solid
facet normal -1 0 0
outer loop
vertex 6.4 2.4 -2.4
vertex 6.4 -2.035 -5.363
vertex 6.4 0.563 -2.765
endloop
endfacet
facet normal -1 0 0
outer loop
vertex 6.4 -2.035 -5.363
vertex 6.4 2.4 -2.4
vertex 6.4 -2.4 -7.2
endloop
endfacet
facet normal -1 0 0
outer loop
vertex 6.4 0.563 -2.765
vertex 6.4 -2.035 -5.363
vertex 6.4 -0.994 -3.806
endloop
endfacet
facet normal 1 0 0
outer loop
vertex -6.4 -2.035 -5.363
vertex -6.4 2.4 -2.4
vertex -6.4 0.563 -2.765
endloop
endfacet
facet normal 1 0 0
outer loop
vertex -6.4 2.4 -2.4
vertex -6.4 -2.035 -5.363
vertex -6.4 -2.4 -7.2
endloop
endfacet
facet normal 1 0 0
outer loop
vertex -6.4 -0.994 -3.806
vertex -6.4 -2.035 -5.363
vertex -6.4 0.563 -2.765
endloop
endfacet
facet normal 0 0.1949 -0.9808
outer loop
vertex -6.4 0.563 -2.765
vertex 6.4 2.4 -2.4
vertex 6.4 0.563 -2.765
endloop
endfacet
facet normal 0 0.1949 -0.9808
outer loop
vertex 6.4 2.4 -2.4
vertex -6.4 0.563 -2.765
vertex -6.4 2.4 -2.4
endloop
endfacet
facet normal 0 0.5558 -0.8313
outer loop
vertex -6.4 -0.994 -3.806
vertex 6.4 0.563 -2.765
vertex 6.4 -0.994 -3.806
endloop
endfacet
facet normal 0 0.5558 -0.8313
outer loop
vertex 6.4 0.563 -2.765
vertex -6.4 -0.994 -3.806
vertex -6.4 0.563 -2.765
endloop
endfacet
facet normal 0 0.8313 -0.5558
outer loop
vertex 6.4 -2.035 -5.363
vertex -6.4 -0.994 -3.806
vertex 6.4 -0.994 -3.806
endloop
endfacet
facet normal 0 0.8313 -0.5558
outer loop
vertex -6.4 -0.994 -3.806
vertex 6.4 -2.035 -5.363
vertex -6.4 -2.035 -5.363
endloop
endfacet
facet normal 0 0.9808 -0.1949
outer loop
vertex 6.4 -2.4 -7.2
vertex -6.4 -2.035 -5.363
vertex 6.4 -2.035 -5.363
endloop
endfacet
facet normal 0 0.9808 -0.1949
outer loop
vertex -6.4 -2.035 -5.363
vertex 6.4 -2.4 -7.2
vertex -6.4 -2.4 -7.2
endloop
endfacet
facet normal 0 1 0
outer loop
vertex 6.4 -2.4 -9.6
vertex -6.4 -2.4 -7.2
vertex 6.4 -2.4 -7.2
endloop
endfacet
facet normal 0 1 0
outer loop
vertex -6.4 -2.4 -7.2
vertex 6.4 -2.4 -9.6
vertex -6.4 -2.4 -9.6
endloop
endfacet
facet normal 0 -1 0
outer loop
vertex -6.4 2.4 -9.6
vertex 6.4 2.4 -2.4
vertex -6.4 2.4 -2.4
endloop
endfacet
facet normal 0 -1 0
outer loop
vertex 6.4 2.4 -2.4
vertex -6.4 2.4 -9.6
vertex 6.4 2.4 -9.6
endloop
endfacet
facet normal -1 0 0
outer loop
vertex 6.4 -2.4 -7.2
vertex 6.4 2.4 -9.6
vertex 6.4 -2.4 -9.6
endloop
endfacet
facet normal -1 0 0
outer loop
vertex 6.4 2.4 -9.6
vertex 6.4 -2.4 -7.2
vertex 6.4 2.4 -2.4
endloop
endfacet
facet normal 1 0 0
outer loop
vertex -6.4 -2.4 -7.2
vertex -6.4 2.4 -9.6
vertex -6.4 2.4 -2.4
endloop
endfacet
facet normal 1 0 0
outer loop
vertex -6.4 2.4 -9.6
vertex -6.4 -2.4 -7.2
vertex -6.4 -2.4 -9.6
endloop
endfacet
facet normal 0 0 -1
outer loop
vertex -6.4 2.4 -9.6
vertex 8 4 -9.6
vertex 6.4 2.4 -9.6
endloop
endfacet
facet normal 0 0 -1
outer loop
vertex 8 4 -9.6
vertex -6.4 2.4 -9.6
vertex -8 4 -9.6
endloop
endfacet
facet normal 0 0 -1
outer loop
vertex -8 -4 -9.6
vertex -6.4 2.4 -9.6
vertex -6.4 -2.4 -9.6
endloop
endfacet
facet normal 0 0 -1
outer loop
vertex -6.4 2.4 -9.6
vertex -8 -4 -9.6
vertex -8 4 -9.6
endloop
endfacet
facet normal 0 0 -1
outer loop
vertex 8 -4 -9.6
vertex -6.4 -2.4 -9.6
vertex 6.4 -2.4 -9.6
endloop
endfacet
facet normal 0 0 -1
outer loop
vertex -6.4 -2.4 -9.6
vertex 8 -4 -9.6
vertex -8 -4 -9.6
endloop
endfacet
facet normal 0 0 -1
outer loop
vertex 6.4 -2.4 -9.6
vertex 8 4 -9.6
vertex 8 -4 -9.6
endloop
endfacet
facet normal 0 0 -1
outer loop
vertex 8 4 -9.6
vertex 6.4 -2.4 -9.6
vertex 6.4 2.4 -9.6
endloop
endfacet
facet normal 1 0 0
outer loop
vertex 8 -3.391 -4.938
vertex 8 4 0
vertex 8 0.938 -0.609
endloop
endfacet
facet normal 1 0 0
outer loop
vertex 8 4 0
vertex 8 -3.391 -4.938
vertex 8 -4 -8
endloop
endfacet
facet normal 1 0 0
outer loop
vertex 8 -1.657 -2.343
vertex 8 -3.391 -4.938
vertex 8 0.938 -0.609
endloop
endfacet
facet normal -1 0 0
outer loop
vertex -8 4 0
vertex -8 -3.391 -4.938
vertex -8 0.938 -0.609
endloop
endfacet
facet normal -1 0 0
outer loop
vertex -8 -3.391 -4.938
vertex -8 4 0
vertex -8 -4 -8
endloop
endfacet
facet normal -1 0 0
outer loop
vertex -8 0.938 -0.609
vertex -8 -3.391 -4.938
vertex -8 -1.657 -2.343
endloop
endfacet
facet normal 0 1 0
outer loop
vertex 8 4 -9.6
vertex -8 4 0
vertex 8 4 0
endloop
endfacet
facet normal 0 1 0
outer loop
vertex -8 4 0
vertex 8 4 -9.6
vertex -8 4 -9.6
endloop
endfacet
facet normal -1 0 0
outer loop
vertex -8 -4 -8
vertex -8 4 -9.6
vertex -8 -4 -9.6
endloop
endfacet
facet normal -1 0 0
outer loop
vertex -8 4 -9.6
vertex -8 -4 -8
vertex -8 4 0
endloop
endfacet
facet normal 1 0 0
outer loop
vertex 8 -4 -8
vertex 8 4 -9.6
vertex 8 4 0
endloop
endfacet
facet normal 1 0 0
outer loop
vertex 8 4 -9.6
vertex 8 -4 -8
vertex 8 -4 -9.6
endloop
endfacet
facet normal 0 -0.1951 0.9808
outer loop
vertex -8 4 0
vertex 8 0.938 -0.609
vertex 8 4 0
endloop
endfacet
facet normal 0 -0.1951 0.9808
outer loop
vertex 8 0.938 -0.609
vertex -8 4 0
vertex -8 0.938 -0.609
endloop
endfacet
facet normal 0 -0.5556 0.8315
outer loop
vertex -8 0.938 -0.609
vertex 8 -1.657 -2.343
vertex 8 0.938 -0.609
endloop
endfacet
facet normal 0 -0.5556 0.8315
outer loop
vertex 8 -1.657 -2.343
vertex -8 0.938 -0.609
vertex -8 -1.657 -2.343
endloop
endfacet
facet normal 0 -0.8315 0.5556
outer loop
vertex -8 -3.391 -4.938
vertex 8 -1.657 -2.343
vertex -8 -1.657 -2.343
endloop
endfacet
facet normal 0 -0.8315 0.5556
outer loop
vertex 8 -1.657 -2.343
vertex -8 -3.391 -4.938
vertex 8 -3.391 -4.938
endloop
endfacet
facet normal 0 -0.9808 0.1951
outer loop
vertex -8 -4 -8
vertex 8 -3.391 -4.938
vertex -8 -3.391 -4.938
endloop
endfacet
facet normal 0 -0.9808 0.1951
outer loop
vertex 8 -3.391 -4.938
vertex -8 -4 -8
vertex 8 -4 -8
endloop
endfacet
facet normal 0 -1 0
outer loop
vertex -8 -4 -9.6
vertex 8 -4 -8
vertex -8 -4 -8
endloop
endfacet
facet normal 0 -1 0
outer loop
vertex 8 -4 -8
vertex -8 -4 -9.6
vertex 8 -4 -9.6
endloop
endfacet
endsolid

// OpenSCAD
// file: ../p/rect3.scad
use <../lib.scad>
function ldraw_lib__rect3() = [
// 0 Rectangle with 3 Edges
// 0 Name: rect3.dat
// 0 Author: Mark Kennedy [mkennedy]
// 0 !LDRAW_ORG Primitive UPDATE 2010-01
// 0 !LICENSE Licensed under CC BY 4.0 : see CAreadme.txt
// 
// 0 BFC CERTIFY CCW
  [0,"BFC","CERTIFY"],
  [0,"BFC","CCW"],
// 
// 0 !HISTORY 2003-08-01 [PTadmin] Official Update 2003-02
// 0 !HISTORY 2007-06-24 [PTadmin] Header formatted for Contributor Agreement
// 0 !HISTORY 2008-07-01 [PTadmin] Official Update 2008-01
// 0 !HISTORY 2010-01-17 [mikeheide] Change winding to CCW
// 0 !HISTORY 2010-04-05 [PTadmin] Official Update 2010-01
// 
// 
// 2 24 1 0 1 -1 0 1
  [2,24,1,0,1,-1,0,1],
// 2 24 1 0 1 1 0 -1
  [2,24,1,0,1,1,0,-1],
// 2 24 -1 0 1 -1 0 -1
  [2,24,-1,0,1,-1,0,-1],
// 4 16 -1 0 1 -1 0 -1 1 0 -1 1 0 1
  [4,16,-1,0,1,-1,0,-1,1,0,-1,1,0,1],
// 0 //
];
module ldraw_lib__rect3(step=0, col=false, unit=2/5, alt=false, line=0.2, solid=!$preview)
    makepoly(ldraw_lib__rect3(), step=step, col=col, unit=unit, alt=alt, line=line, solid=solid);
ldraw_lib__rect3(line=0.2);
// file: ../p/rect.scad
use <../lib.scad>
function ldraw_lib__rect() = [
// 0 Rectangle
// 0 Name: rect.dat
// 0 Author: James Jessiman
// 0 !LDRAW_ORG Primitive UPDATE 2010-01
// 0 !LICENSE Licensed under CC BY 4.0 : see CAreadme.txt
// 
// 0 BFC CERTIFY CCW
  [0,"BFC","CERTIFY"],
  [0,"BFC","CCW"],
// 
// 0 !HISTORY 2002-04-05 [hafhead] Added BFC statement
// 0 !HISTORY 2002-04-25 [PTadmin] Official Update 2002-02
// 0 !HISTORY 2007-06-24 [PTadmin] Header formatted for Contributor Agreement
// 0 !HISTORY 2008-07-01 [PTadmin] Official Update 2008-01
// 0 !HISTORY 2010-01-17 [mikeheide] changed winding to CCW
// 0 !HISTORY 2010-04-05 [PTadmin] Official Update 2010-01
// 
// 
// 2 24 1 0 1 -1 0 1
  [2,24,1,0,1,-1,0,1],
// 2 24 -1 0 1 -1 0 -1
  [2,24,-1,0,1,-1,0,-1],
// 2 24 -1 0 -1 1 0 -1
  [2,24,-1,0,-1,1,0,-1],
// 2 24 1 0 -1 1 0 1
  [2,24,1,0,-1,1,0,1],
// 4 16 -1 0 1 -1 0 -1 1 0 -1 1 0 1
  [4,16,-1,0,1,-1,0,-1,1,0,-1,1,0,1],
// 0
];
module ldraw_lib__rect(step=0, col=false, unit=2/5, alt=false, line=0.2, solid=!$preview)
    makepoly(ldraw_lib__rect(), step=step, col=col, unit=unit, alt=alt, line=line, solid=solid);
ldraw_lib__rect(line=0.2);
// file: ../p/1-4edge.scad
use <../lib.scad>
function ldraw_lib__1_4edge() = [
// 0 Circle 0.25
// 0 Name: 1-4edge.dat
// 0 Author: James Jessiman
// 0 !LDRAW_ORG Primitive UPDATE 2017-01
// 0 !LICENSE Licensed under CC BY 4.0 : see CAreadme.txt
// 
// 0 BFC CERTIFY CCW
  [0,"BFC","CERTIFY"],
  [0,"BFC","CCW"],
// 
// 0 !HISTORY 2007-06-22 [PTadmin] Header formatted for Contributor Agreement
// 0 !HISTORY 2008-07-01 [PTadmin] Official Update 2008-01
// 0 !HISTORY 2017-01-15 [Steffen] BFCed
// 0 !HISTORY 2017-12-30 [PTadmin] Official Update 2017-01
// 
// 
// 2 24 1 0 0 0.9239 0 0.3827
  [2,24,1,0,0,0.9239,0,0.3827],
// 2 24 0.9239 0 0.3827 0.7071 0 0.7071
  [2,24,0.9239,0,0.3827,0.7071,0,0.7071],
// 2 24 0.7071 0 0.7071 0.3827 0 0.9239
  [2,24,0.7071,0,0.7071,0.3827,0,0.9239],
// 2 24 0.3827 0 0.9239 0 0 1
  [2,24,0.3827,0,0.9239,0,0,1],
];
module ldraw_lib__1_4edge(step=0, col=false, unit=2/5, alt=false, line=0.2, solid=!$preview)
    makepoly(ldraw_lib__1_4edge(), step=step, col=col, unit=unit, alt=alt, line=line, solid=solid);
ldraw_lib__1_4edge(line=0.2);
// file: ../p/1-4cylo.scad
use <../lib.scad>
use <1-4cyli.scad>
use <1-4edge.scad>
function ldraw_lib__1_4cylo() = [
// 0 Cylinder Open 0.25
// 0 Name: 1-4cylo.dat
// 0 Author: Max Martin Richter [MMR1988]
// 0 !LDRAW_ORG Primitive UPDATE 2010-03
// 0 !LICENSE Licensed under CC BY 4.0 : see CAreadme.txt
// 
// 0 BFC CERTIFY CCW
  [0,"BFC","CERTIFY"],
  [0,"BFC","CCW"],
// 
// 0 !HISTORY 2010-12-31 [PTadmin] Official Update 2010-03
// 
// 
// 1 16 0 0 0 1 0 0 0 1 0 0 0 1 1-4edge.dat
  [1,16,0,0,0,1,0,0,0,1,0,0,0,1, ldraw_lib__1_4edge()],
// 1 16 0 1 0 1 0 0 0 1 0 0 0 1 1-4edge.dat
  [1,16,0,1,0,1,0,0,0,1,0,0,0,1, ldraw_lib__1_4edge()],
// 1 16 0 0 0 1 0 0 0 1 0 0 0 1 1-4cyli.dat
  [1,16,0,0,0,1,0,0,0,1,0,0,0,1, ldraw_lib__1_4cyli()],
];
module ldraw_lib__1_4cylo(step=0, col=false, unit=2/5, alt=false, line=0.2, solid=!$preview)
    makepoly(ldraw_lib__1_4cylo(), step=step, col=col, unit=unit, alt=alt, line=line, solid=solid);
ldraw_lib__1_4cylo(line=0.2);
// file: ../p/1-4chrd.scad
use <../lib.scad>
function ldraw_lib__1_4chrd() = [
// 0 Chord 0.25
// 0 Name: 1-4chrd.dat
// 0 Author: Max Martin Richter [MMR1988]
// 0 !LDRAW_ORG Primitive UPDATE 2023-05
// 0 !LICENSE Licensed under CC BY 4.0 : see CAreadme.txt
// 
// 0 BFC CERTIFY CCW
  [0,"BFC","CERTIFY"],
  [0,"BFC","CCW"],
// 
// 0 !HISTORY 2004-04-22 [PTadmin] Official Update 2004-02
// 0 !HISTORY 2007-10-09 [PTadmin] Header formatted for Contributor Agreement
// 0 !HISTORY 2008-07-01 [PTadmin] Official Update 2008-01
// 0 !HISTORY 2012-08-02 [MMR1988] Re-creation with PrimGen2 and Rectifier
// 0 !HISTORY 2012-08-09 [PTadmin] Official Update 2012-02
// 0 !HISTORY 2023-10-27 [OrionP] Change author to MMR1988 from hafhead
// 0 !HISTORY 2023-10-31 [OrionP] Official Update 2023-05
// 
// 4 16 0.9239 0 0.3827 0.3827 0 0.9239 0 0 1 1 0 0
  [4,16,0.9239,0,0.3827,0.3827,0,0.9239,0,0,1,1,0,0],
// 3 16 0.7071 0 0.7071 0.3827 0 0.9239 0.9239 0 0.3827
  [3,16,0.7071,0,0.7071,0.3827,0,0.9239,0.9239,0,0.3827],
];
module ldraw_lib__1_4chrd(step=0, col=false, unit=2/5, alt=false, line=0.2, solid=!$preview)
    makepoly(ldraw_lib__1_4chrd(), step=step, col=col, unit=unit, alt=alt, line=line, solid=solid);
ldraw_lib__1_4chrd(line=0.2);
// file: s/7134s01.scad
use <../../lib.scad>
use <../../p/1-4chrd.scad>
use <../../p/1-4cylo.scad>
use <../../p/1-4edge.scad>
use <../../p/rect.scad>
use <../../p/rect3.scad>
function ldraw_lib__s__7134s01() = [
// 0 ~Brick  1 x  2 with Curved Top without Stud Holders without Patternable Surfaces
// 0 Name: s\7134s01.dat
// 0 Author: Rene Rechthaler [Blechtaler]
// 0 !LDRAW_ORG Subpart UPDATE 2025-07
// 0 !LICENSE Licensed under CC BY 4.0 : see CAreadme.txt
// 
// 0 BFC CERTIFY CCW
  [0,"BFC","CERTIFY"],
  [0,"BFC","CCW"],
// 
// 0 !HISTORY 2025-04-06 [Blechtaler] made from 37352s01 by [Philo]
// 0 !HISTORY 2025-07-27 [OrionP] Official Update 2025-07
// 
// 0 // inside
// 1 16 16 18 6 0 1 0 -12 0 0 0 0 -12 1-4chrd.dat
  [1,16,16,18,6,0,1,0,-12,0,0,0,0,-12, ldraw_lib__1_4chrd()],
// 1 16 -16 18 6 0 -1 0 -12 0 0 0 0 -12 1-4chrd.dat
  [1,16,-16,18,6,0,-1,0,-12,0,0,0,0,-12, ldraw_lib__1_4chrd()],
// 0 BFC INVERTNEXT
  [0,"BFC","INVERTNEXT"],
// 1 16 -16 18 6 0 32 0 -12 0 0 0 0 -12 1-4cylo.dat
  [1,16,-16,18,6,0,32,0,-12,0,0,0,0,-12, ldraw_lib__1_4cylo()],
// 1 16 0 21 -6 16 0 0 0 0 3 0 -1 0 rect3.dat
  [1,16,0,21,-6,16,0,0,0,0,3,0,-1,0, ldraw_lib__rect3()],
// 1 16 0 15 6 16 0 0 0 0 9 0 1 0 rect.dat
  [1,16,0,15,6,16,0,0,0,0,9,0,1,0, ldraw_lib__rect()],
// 2 24 16 24 6 16 24 -6
  [2,24,16,24,6,16,24,-6],
// 4 16 16 6 6 16 24 6 16 24 -6 16 18 -6
  [4,16,16,6,6,16,24,6,16,24,-6,16,18,-6],
// 2 24 -16 24 -6 -16 24 6
  [2,24,-16,24,-6,-16,24,6],
// 4 16 -16 18 -6 -16 24 -6 -16 24 6 -16 6 6
  [4,16,-16,18,-6,-16,24,-6,-16,24,6,-16,6,6],
// 
// 0 // bottom
// 4 16 20 24 10 16 24 6 -16 24 6 -20 24 10
  [4,16,20,24,10,16,24,6,-16,24,6,-20,24,10],
// 4 16 -20 24 10 -16 24 6 -16 24 -6 -20 24 -10
  [4,16,-20,24,10,-16,24,6,-16,24,-6,-20,24,-10],
// 4 16 -20 24 -10 -16 24 -6 16 24 -6 20 24 -10
  [4,16,-20,24,-10,-16,24,-6,16,24,-6,20,24,-10],
// 4 16 20 24 -10 16 24 -6 16 24 6 20 24 10
  [4,16,20,24,-10,16,24,-6,16,24,6,20,24,10],
// 
// 0 // outer
// 1 16 20 20 10 0 -1 0 -20 0 0 0 0 -20 1-4chrd.dat
  [1,16,20,20,10,0,-1,0,-20,0,0,0,0,-20, ldraw_lib__1_4chrd()],
// 1 16 -20 20 10 0 1 0 -20 0 0 0 0 -20 1-4chrd.dat
  [1,16,-20,20,10,0,1,0,-20,0,0,0,0,-20, ldraw_lib__1_4chrd()],
// 2 24 -20 24 10 -20 24 -10
  [2,24,-20,24,10,-20,24,-10],
// 2 24 20 24 -10 20 24 10
  [2,24,20,24,-10,20,24,10],
// 1 16 0 12 10 -20 0 0 0 0 -12 0 -1 0 rect.dat
  [1,16,0,12,10,-20,0,0,0,0,-12,0,-1,0, ldraw_lib__rect()],
// 4 16 -20 24 10 -20 24 -10 -20 20 -10 -20 0 10
  [4,16,-20,24,10,-20,24,-10,-20,20,-10,-20,0,10],
// 4 16 20 24 -10 20 24 10 20 0 10 20 20 -10
  [4,16,20,24,-10,20,24,10,20,0,10,20,20,-10],
// 1 16 20 20 10 0 -40 0 0 0 -20 -20 0 0 1-4edge.dat
  [1,16,20,20,10,0,-40,0,0,0,-20,-20,0,0, ldraw_lib__1_4edge()],
// 1 16 -20 20 10 0 -40 0 0 0 -20 -20 0 0 1-4edge.dat
  [1,16,-20,20,10,0,-40,0,0,0,-20,-20,0,0, ldraw_lib__1_4edge()],
// 2 24 -20 24 -10 20 24 -10
  [2,24,-20,24,-10,20,24,-10],
// 2 24 -20 24 -10 -20 20 -10
  [2,24,-20,24,-10,-20,20,-10],
// 2 24 20 24 -10 20 20 -10
  [2,24,20,24,-10,20,20,-10],
];
module ldraw_lib__s__7134s01(step=0, col=false, unit=2/5, alt=false, line=0.2, solid=!$preview)
    makepoly(ldraw_lib__s__7134s01(), step=step, col=col, unit=unit, alt=alt, line=line, solid=solid);
ldraw_lib__s__7134s01(line=0.2);
// file: ../p/1-4cyli.scad
use <../lib.scad>
function ldraw_lib__1_4cyli() = [
// 0 Cylinder 0.25
// 0 Name: 1-4cyli.dat
// 0 Author: James Jessiman
// 0 !LDRAW_ORG Primitive UPDATE 2012-01
// 0 !LICENSE Licensed under CC BY 4.0 : see CAreadme.txt
// 
// 0 BFC CERTIFY CCW
  [0,"BFC","CERTIFY"],
  [0,"BFC","CCW"],
// 
// 0 !HISTORY 2002-03-23 [sbliss] Added BFC statement.
// 0 !HISTORY 2002-04-25 [PTadmin] Official Update 2002-02
// 0 !HISTORY 2007-06-22 [PTadmin] Header formatted for Contributor Agreement
// 0 !HISTORY 2008-07-01 [PTadmin] Official Update 2008-01
// 0 !HISTORY 2012-02-16 [Philo] Changed to CCW
// 0 !HISTORY 2012-03-30 [PTadmin] Official Update 2012-01
// 
// 
// 4 16 1 1 0 0.9239 1 0.3827 0.9239 0 0.3827 1 0 0
  [4,16,1,1,0,0.9239,1,0.3827,0.9239,0,0.3827,1,0,0],
// 5 24 1 0 0 1 1 0 0.9239 0 0.3827 1 0 -1
  [5,24,1,0,0,1,1,0,0.9239,0,0.3827,1,0,-1],
// 4 16 0.9239 1 0.3827 0.7071 1 0.7071 0.7071 0 0.7071 0.9239 0 0.3827
  [4,16,0.9239,1,0.3827,0.7071,1,0.7071,0.7071,0,0.7071,0.9239,0,0.3827],
// 5 24 0.9239 0 0.3827 0.9239 1 0.3827 0.7071 0 0.7071 1 0 0
  [5,24,0.9239,0,0.3827,0.9239,1,0.3827,0.7071,0,0.7071,1,0,0],
// 4 16 0.7071 1 0.7071 0.3827 1 0.9239 0.3827 0 0.9239 0.7071 0 0.7071
  [4,16,0.7071,1,0.7071,0.3827,1,0.9239,0.3827,0,0.9239,0.7071,0,0.7071],
// 5 24 0.7071 0 0.7071 0.7071 1 0.7071 0.3827 0 0.9239 0.9239 0 0.3827
  [5,24,0.7071,0,0.7071,0.7071,1,0.7071,0.3827,0,0.9239,0.9239,0,0.3827],
// 4 16 0.3827 1 0.9239 0 1 1 0 0 1 0.3827 0 0.9239
  [4,16,0.3827,1,0.9239,0,1,1,0,0,1,0.3827,0,0.9239],
// 5 24 0.3827 0 0.9239 0.3827 1 0.9239 0 0 1 0.7071 0 0.7071
  [5,24,0.3827,0,0.9239,0.3827,1,0.9239,0,0,1,0.7071,0,0.7071],
// 5 24 0 0 1 0 1 1 0.3827 0 0.9239 -1 0 1
  [5,24,0,0,1,0,1,1,0.3827,0,0.9239,-1,0,1],
];
module ldraw_lib__1_4cyli(step=0, col=false, unit=2/5, alt=false, line=0.2, solid=!$preview)
    makepoly(ldraw_lib__1_4cyli(), step=step, col=col, unit=unit, alt=alt, line=line, solid=solid);
ldraw_lib__1_4cyli(line=0.2);
// main file
use <../lib.scad>
use <../p/1-4cyli.scad>
use <s/7134s01.scad>
function ldraw_lib__7134() = [
// 0 Brick  1 x  2 with Curved Top without Stud Holders
// 0 Name: 7134.dat
// 0 Author: Rene Rechthaler [Blechtaler]
// 0 !LDRAW_ORG Part UPDATE 2025-07
// 0 !LICENSE Licensed under CC BY 4.0 : see CAreadme.txt
// 
// 0 BFC CERTIFY CCW
  [0,"BFC","CERTIFY"],
  [0,"BFC","CCW"],
// 
// 0 !HISTORY 2025-04-06 [Blechtaler] made from 37352 by [MagFors]
// 0 !HISTORY 2025-07-27 [OrionP] Official Update 2025-07
// 
// 1 16 0 0 0 1 0 0 0 1 0 0 0 1 s\7134s01.dat
  [1,16,0,0,0,1,0,0,0,1,0,0,0,1, ldraw_lib__s__7134s01()],
// 
// 1 16 20 20 10 0 -40 0 -20 0 0 0 0 -20 1-4cyli.dat
  [1,16,20,20,10,0,-40,0,-20,0,0,0,0,-20, ldraw_lib__1_4cyli()],
// 4 16 20 24 -10 20 20 -10 -20 20 -10 -20 24 -10
  [4,16,20,24,-10,20,20,-10,-20,20,-10,-20,24,-10],
];
module ldraw_lib__7134(step=0, col=false, unit=2/5, alt=false, line=0.2, solid=!$preview)
    makepoly(ldraw_lib__7134(), step=step, col=col, unit=unit, alt=alt, line=line, solid=solid);
ldraw_lib__7134(line=0.2);
